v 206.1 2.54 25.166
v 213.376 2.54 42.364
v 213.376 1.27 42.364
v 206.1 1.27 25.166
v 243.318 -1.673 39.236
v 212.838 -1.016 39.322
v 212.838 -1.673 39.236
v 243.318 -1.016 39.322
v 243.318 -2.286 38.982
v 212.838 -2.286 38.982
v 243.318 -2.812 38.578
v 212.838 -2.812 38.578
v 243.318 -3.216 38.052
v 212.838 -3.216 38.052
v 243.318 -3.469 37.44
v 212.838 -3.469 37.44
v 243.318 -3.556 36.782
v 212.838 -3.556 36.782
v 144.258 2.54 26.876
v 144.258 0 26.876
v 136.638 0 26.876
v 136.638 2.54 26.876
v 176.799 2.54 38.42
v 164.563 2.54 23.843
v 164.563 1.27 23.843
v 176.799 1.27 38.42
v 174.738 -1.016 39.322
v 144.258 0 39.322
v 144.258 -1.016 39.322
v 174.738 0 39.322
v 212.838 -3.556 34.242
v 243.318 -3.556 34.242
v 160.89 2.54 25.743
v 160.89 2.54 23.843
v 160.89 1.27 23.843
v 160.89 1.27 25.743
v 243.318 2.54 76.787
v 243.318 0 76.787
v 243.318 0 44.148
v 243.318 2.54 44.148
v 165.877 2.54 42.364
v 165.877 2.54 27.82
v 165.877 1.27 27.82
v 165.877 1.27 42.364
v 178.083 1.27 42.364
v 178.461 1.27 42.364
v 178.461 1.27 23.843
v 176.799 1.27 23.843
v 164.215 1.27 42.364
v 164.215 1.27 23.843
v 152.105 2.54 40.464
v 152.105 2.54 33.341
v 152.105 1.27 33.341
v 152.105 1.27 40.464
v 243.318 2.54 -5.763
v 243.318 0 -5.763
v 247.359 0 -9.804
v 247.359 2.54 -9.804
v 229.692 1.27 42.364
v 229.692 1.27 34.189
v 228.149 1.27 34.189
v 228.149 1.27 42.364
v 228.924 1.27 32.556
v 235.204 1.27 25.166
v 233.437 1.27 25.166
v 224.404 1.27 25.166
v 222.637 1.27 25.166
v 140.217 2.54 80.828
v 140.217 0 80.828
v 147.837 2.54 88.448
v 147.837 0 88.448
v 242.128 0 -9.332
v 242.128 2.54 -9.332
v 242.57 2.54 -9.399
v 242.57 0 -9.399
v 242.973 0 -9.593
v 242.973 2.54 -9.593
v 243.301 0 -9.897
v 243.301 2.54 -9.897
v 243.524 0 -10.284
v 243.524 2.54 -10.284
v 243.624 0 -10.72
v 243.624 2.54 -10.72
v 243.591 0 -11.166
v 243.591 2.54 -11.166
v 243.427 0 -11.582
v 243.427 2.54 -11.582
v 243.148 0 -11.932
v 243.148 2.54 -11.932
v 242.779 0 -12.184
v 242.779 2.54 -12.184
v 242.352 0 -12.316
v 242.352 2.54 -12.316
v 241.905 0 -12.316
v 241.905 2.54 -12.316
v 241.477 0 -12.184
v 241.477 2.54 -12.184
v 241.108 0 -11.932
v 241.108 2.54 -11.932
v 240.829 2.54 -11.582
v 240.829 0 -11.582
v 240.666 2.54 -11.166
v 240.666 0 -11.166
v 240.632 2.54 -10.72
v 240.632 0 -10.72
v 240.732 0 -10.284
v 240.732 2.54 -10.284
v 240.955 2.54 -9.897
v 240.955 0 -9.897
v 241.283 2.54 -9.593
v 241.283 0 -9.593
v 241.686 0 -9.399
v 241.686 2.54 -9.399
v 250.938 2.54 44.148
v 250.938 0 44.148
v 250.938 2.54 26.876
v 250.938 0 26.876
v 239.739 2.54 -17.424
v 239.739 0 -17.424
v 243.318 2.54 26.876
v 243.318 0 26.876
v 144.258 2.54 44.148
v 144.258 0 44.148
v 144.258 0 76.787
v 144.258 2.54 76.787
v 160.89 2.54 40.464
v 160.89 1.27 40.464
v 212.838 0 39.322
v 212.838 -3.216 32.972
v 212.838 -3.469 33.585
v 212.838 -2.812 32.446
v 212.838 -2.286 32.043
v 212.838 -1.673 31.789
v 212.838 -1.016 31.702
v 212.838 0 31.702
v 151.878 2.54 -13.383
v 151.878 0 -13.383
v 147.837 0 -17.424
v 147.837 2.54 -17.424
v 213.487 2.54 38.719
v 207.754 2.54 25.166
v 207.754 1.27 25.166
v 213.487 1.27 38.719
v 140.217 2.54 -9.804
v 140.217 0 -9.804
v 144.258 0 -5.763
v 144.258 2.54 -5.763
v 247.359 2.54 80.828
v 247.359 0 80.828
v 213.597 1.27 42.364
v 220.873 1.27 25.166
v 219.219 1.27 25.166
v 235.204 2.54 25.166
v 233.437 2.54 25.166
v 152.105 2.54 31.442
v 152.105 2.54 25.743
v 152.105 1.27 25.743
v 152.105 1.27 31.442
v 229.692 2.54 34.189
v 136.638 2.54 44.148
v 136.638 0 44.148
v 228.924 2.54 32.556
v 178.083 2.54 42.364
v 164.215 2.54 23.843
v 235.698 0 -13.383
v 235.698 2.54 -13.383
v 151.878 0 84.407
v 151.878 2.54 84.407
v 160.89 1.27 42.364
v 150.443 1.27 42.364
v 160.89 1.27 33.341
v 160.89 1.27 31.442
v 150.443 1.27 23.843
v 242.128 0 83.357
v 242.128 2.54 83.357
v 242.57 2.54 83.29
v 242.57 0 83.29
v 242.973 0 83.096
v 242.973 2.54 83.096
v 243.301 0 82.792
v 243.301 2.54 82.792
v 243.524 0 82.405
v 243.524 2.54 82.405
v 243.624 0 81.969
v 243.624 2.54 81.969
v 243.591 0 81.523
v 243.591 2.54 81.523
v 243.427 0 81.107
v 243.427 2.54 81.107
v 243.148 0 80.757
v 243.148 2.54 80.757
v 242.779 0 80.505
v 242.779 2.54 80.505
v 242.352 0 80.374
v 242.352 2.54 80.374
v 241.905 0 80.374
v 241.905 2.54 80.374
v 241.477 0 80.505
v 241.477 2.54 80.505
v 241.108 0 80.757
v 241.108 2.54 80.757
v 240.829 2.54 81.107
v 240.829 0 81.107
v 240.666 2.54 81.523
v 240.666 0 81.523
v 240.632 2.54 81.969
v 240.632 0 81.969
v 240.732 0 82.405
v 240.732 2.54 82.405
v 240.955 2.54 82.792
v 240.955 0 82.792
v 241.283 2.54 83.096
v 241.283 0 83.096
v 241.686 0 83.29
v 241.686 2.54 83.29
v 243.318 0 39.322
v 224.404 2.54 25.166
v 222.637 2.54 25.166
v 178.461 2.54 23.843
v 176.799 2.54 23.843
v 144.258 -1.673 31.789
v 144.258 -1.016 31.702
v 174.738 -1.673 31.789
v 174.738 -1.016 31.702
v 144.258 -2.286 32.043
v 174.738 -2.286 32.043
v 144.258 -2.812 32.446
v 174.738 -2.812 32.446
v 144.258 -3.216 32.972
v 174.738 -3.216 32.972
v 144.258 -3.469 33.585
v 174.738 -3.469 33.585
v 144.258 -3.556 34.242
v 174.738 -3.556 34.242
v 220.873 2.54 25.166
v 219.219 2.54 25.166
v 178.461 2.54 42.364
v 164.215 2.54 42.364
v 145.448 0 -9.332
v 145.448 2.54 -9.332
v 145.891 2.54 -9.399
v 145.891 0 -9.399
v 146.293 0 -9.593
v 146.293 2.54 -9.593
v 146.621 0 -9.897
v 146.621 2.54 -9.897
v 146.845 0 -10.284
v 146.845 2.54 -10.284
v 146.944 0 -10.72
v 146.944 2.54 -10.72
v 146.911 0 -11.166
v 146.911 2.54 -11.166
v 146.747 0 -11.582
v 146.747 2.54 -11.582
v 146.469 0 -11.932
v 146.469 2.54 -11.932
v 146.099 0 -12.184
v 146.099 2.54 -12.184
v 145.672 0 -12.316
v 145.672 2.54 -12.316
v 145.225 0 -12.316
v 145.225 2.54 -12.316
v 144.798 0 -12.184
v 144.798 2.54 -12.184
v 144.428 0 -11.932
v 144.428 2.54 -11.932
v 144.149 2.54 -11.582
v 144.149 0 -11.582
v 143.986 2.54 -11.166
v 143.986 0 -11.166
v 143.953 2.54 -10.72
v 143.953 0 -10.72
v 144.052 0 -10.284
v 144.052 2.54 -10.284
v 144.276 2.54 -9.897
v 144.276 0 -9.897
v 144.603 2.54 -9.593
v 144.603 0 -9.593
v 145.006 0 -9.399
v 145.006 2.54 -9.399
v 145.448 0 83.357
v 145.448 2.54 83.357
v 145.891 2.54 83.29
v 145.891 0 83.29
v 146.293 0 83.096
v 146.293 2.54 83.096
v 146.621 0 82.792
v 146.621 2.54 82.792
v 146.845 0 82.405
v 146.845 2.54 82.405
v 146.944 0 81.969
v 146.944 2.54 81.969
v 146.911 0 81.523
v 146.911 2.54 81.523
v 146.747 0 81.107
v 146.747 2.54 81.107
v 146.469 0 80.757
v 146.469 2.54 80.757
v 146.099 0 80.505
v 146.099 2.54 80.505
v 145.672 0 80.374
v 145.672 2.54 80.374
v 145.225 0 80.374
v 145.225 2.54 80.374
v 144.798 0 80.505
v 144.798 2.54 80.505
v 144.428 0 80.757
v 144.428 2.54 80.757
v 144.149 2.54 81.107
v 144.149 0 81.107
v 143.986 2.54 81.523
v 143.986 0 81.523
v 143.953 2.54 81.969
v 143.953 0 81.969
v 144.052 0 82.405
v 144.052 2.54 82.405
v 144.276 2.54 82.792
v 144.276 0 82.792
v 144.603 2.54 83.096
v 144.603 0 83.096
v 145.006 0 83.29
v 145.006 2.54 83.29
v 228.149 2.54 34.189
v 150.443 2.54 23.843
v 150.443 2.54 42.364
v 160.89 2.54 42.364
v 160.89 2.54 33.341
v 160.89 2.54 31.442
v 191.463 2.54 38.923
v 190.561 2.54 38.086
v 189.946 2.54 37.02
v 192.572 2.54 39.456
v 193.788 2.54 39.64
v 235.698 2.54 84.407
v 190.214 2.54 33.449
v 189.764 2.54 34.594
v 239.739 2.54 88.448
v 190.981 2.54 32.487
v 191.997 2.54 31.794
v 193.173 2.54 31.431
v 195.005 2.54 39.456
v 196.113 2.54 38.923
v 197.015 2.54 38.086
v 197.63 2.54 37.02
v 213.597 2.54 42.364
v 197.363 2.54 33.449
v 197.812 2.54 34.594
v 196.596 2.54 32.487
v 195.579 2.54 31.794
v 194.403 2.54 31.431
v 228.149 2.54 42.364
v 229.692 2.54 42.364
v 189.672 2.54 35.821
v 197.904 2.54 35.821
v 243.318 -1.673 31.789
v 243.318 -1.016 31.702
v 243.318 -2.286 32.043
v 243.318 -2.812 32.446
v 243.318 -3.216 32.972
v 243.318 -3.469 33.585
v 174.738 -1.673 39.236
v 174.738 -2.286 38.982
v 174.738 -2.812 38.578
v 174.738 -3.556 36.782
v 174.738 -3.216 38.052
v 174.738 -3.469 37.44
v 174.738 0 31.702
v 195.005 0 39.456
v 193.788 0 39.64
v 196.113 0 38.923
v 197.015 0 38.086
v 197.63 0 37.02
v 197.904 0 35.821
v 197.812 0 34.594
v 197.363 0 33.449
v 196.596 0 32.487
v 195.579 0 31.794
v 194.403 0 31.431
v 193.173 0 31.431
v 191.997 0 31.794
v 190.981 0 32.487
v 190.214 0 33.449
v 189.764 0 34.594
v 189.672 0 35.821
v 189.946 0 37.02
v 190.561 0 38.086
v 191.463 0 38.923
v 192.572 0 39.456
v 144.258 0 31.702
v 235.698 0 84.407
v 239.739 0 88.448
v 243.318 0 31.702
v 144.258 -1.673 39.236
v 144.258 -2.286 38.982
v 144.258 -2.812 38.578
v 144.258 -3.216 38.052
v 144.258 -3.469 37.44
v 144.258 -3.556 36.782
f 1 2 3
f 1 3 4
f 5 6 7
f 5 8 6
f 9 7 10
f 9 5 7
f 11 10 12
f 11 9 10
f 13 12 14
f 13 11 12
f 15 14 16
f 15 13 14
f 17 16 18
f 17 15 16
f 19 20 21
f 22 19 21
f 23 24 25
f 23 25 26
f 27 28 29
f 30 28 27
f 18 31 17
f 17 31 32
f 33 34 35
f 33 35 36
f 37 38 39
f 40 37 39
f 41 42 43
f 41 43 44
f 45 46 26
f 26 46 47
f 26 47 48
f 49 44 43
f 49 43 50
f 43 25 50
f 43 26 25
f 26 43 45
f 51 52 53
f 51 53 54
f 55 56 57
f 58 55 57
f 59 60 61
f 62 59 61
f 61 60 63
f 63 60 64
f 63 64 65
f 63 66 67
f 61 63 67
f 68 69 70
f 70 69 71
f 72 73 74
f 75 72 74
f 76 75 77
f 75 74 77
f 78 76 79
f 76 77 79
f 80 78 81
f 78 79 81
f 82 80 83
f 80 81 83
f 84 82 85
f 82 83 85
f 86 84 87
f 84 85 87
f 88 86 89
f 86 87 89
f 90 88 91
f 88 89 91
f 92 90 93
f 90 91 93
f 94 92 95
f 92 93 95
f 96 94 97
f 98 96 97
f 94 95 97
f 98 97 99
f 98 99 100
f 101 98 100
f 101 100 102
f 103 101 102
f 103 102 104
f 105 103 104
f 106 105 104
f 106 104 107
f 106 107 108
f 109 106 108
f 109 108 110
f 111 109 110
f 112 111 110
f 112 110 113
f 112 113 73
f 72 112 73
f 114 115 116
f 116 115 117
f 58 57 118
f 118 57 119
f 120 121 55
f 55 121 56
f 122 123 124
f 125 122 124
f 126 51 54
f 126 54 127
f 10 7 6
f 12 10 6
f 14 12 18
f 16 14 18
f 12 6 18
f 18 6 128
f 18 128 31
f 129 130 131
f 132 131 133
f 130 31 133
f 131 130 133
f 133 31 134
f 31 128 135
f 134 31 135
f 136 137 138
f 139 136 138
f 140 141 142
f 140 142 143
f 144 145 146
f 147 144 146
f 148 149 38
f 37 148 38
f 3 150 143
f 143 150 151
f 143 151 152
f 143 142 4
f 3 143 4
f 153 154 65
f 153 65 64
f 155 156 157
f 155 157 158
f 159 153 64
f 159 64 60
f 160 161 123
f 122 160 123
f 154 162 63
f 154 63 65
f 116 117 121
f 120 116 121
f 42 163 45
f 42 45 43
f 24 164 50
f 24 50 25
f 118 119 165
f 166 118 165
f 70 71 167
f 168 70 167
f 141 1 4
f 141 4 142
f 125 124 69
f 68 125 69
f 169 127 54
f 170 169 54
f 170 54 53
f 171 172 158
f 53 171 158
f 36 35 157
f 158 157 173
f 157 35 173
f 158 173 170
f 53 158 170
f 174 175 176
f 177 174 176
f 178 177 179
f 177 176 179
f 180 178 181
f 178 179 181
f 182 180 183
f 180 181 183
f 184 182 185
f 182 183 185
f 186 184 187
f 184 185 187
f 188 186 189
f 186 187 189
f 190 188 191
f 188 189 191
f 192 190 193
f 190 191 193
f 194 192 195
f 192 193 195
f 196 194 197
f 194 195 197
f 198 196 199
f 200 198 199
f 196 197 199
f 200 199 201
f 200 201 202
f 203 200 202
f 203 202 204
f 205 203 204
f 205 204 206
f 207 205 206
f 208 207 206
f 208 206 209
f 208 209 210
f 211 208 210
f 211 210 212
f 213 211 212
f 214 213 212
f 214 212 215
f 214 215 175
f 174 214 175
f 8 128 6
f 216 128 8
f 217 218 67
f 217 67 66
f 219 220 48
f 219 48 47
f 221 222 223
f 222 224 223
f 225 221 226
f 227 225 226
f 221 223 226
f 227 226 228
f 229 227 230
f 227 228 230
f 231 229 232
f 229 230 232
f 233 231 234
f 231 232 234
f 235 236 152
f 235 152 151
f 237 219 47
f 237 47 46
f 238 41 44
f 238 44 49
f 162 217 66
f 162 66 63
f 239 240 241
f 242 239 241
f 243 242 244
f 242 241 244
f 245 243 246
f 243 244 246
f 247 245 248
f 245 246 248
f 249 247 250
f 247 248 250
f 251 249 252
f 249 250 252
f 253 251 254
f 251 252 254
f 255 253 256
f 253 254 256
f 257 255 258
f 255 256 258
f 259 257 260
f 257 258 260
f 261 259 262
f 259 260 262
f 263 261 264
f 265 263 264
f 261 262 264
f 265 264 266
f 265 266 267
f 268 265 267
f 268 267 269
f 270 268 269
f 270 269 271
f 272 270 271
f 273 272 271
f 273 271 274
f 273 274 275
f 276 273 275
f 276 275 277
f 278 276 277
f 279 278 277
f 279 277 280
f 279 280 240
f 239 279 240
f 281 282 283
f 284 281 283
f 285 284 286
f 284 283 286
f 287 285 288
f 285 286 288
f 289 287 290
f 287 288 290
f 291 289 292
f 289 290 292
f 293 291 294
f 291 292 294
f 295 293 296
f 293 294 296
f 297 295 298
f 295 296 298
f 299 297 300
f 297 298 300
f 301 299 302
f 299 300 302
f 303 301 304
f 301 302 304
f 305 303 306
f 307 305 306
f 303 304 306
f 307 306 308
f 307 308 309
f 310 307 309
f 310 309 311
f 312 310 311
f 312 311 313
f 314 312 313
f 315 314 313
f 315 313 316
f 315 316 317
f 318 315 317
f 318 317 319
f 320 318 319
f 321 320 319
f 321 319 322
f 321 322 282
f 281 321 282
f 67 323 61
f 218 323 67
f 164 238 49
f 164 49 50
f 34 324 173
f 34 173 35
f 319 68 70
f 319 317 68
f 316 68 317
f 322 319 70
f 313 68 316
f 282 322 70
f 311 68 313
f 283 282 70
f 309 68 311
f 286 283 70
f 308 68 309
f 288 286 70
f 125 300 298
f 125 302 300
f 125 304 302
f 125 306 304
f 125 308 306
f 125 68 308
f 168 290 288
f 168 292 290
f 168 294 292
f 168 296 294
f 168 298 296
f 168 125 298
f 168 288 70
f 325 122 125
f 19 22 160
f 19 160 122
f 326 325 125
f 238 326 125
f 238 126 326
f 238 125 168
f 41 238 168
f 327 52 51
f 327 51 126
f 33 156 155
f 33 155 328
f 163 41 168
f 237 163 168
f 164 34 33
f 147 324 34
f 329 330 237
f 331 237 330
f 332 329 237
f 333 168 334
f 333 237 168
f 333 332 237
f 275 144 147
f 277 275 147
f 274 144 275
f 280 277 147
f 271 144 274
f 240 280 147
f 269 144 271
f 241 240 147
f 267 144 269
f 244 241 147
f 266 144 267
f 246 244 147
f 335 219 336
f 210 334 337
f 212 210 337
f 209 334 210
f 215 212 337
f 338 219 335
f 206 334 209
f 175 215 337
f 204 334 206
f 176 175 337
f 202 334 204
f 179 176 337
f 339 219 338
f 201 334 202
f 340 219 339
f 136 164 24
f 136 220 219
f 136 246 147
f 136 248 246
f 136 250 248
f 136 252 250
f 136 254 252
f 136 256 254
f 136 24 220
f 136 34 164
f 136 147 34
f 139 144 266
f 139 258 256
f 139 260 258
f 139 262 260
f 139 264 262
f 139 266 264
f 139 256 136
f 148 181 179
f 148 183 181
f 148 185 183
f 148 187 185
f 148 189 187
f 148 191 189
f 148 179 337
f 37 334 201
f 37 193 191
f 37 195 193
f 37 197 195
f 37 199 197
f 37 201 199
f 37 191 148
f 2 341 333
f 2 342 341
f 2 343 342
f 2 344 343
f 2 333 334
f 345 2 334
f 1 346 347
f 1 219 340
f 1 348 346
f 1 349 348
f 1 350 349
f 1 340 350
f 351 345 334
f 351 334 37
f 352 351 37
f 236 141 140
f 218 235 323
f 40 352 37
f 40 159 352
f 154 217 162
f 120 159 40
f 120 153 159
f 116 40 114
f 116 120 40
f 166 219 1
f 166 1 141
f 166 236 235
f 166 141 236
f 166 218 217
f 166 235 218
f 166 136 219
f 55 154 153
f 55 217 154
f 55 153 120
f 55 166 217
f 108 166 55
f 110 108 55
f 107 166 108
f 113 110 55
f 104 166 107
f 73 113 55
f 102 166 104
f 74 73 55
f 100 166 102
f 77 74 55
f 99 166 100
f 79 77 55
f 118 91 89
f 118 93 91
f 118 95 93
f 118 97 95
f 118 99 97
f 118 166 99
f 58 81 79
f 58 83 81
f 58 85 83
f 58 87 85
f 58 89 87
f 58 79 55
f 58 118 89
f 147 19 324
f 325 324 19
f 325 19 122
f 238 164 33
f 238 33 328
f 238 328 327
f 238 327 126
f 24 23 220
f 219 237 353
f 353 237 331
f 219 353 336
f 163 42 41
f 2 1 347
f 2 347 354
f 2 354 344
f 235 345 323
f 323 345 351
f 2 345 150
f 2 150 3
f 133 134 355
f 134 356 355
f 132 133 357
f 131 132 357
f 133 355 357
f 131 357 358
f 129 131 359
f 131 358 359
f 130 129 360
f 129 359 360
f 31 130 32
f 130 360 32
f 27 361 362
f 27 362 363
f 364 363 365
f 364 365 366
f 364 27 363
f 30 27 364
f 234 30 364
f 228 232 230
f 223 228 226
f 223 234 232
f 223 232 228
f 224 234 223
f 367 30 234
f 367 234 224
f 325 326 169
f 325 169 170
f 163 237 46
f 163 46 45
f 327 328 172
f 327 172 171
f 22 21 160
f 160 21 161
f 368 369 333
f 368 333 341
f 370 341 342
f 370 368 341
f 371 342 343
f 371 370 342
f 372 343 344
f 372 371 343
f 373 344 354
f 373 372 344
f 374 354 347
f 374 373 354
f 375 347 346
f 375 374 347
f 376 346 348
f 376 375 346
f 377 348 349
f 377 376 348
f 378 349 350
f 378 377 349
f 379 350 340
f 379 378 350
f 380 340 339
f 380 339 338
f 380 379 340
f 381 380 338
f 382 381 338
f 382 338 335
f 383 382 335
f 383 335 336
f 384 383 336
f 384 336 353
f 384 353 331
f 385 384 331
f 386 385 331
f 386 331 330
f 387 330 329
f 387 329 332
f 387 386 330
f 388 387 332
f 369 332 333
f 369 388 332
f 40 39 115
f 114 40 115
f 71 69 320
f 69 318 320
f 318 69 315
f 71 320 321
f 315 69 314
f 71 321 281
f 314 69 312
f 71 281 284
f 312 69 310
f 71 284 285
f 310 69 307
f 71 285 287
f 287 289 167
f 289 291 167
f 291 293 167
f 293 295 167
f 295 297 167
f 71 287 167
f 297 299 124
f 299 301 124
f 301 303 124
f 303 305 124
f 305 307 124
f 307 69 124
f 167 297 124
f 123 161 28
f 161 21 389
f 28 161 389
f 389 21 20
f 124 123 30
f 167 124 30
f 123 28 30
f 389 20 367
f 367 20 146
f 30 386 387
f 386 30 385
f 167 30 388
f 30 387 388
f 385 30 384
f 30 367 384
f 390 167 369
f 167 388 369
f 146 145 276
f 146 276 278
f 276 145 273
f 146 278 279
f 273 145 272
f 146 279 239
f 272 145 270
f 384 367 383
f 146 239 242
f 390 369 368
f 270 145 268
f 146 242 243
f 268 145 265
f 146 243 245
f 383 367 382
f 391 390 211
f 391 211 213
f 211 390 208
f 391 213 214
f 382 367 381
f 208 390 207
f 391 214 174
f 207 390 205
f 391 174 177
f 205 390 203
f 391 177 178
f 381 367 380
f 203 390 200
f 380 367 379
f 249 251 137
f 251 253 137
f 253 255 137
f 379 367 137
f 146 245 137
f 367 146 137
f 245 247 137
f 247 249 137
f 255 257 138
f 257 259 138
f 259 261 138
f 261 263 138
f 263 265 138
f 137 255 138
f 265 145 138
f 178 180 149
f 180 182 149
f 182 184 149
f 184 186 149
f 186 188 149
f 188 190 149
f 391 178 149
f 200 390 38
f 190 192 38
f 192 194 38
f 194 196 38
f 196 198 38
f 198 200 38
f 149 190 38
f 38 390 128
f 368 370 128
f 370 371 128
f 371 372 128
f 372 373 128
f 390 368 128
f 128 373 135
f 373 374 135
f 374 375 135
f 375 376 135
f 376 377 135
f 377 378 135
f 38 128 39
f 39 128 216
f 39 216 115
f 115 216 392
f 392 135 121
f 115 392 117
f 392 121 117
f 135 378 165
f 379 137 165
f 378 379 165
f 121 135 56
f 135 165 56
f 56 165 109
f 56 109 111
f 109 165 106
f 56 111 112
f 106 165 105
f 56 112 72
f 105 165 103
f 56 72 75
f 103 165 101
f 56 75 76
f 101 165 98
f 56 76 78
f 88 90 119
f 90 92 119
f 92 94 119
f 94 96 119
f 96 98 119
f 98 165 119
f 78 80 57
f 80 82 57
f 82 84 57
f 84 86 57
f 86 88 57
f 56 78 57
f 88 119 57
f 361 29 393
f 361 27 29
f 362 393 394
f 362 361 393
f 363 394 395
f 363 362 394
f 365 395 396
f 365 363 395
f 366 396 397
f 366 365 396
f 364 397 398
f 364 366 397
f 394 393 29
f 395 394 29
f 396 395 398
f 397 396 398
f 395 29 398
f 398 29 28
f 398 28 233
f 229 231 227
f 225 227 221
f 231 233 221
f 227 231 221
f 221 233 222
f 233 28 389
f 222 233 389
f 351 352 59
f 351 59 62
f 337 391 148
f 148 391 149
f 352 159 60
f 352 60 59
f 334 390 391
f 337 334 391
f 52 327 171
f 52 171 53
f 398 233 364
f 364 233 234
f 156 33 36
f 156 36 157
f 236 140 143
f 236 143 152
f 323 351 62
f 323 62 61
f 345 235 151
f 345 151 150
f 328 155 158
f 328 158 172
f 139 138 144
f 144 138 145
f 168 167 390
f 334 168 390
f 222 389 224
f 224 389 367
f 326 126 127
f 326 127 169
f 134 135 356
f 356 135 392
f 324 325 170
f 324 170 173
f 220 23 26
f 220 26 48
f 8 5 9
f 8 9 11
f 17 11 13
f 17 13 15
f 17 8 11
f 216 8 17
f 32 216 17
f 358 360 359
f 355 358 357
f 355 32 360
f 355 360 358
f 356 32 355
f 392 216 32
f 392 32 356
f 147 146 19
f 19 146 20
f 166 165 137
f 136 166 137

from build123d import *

# Parameters (mm, degrees)
SKETCH1_R           = 4.1275
BOSS_EXTRUDE1_DEPTH = 2.54
SKETCH2_R           = 1.5
CUT_EXTRUDE1_DEPTH  = 267.081941915
CUT_EXTRUDE2_DEPTH  = 1.27
SKETCH1_5_W         = 30.48
SKETCH1_5_H         = 7.62
BOSS_EXTRUDE2_DEPTH = 3.556
FILLET1_R           = 2.54


with BuildPart() as part:
    # Sketch1 → Boss-Extrude1 (new body)
    with BuildSketch(Plane(origin=(0, 0, 0), x_dir=(1, 0, 0), z_dir=(0, 1, 0))):
        Polygon((239.739404703, 17.423809937), (235.698289449, 13.382694682), (151.878289449, 13.382694682), (147.837174194, 17.423809937), (140.217174194, 9.803809937), (144.258289449, 5.762694682), (144.258289449, -26.876305318), (136.638289449, -26.876305318), (136.638289449, -44.148305318), (144.258289449, -44.148305318), (144.258289449, -76.787305318), (140.217174194, -80.828420572), (147.837174194, -88.448420572), (151.878289449, -84.407305318), (235.698289449, -84.407305318), (239.739404703, -88.448420572), (247.359404703, -80.828420572), (243.318289449, -76.787305318), (243.318289449, -44.148305318), (250.938289449, -44.148305318), (250.938289449, -26.876305318), (243.318289449, -26.876305318), (243.318289449, 5.762694682), (247.359404703, 9.803809937), align=None)
        with Locations((193.788289449, -35.512305318)):
            Circle(SKETCH1_R, mode=Mode.SUBTRACT)
    extrude(amount=BOSS_EXTRUDE1_DEPTH)

    # Sketch2 → Cut-Extrude1 (cut, through all)
    with BuildSketch(Plane(origin=(0, 2.54, 0), x_dir=(1, 0, 0), z_dir=(0, 1, 0))):
        with Locations((145.448426066, 10.832301944)):
            Circle(SKETCH2_R)
        with Locations((242.128152831, 10.832301944)):
            Circle(SKETCH2_R)
        with Locations((242.128152831, -81.856912579)):
            Circle(SKETCH2_R)
        with Locations((145.448426066, -81.856912579)):
            Circle(SKETCH2_R)
    extrude(amount=-CUT_EXTRUDE1_DEPTH, mode=Mode.SUBTRACT)

    # Sketch3 → Cut-Extrude2 (cut)
    with BuildSketch(Plane(origin=(0, 2.54, 0), x_dir=(1, 0, 0), z_dir=(0, 1, 0))):
        Polygon((150.442755261, -23.843216639), (160.890404833, -23.843216639), (160.890404833, -25.742789289), (152.104881329, -25.742789289), (152.104881329, -31.441507237), (160.890404833, -31.441507237), (160.890404833, -33.341079887), (152.104881329, -33.341079887), (152.104881329, -40.464477323), (160.890404833, -40.464477323), (160.890404833, -42.364049972), (150.442755261, -42.364049972), align=None)
        Polygon((164.21465697, -42.364049972), (164.21465697, -23.843216639), (164.563406636, -23.843216639), (176.799325773, -38.420210663), (176.799325773, -23.843216639), (178.461451842, -23.843216639), (178.461451842, -42.364049972), (178.083021353, -42.364049972), (165.876783038, -27.820446874), (165.876783038, -42.364049972), align=None)
        Polygon((206.100233893, -25.166133306), (207.753879726, -25.166133306), (213.486518615, -38.719138948), (219.219157504, -25.166133306), (220.872803338, -25.166133306), (213.596761671, -42.364049972), (213.37627556, -42.364049972), align=None)
        Polygon((222.636692226, -25.166133306), (224.404026211, -25.166133306), (228.923991489, -32.555863124), (233.437066575, -25.166133306), (235.20440056, -25.166133306), (229.692247782, -34.188838384), (229.692247782, -42.364049972), (228.148845004, -42.364049972), (228.148845004, -34.188838384), align=None)
    extrude(amount=-CUT_EXTRUDE2_DEPTH, mode=Mode.SUBTRACT)

    # Sketch1<5> → Boss-Extrude2 (add)
    with BuildSketch(Plane(origin=(0, 0, 0), x_dir=(1, 0, 0), z_dir=(0, 1, 0))):
        with Locations((228.078289449, -35.512305318)):
            Rectangle(SKETCH1_5_W, SKETCH1_5_H)
        with Locations((159.498289449, -35.512305318)):
            Rectangle(SKETCH1_5_W, SKETCH1_5_H)
    extrude(amount=-BOSS_EXTRUDE2_DEPTH)

    # Fillet1
    fillet1_edges = [part.edges().sort_by_distance(p)[0] for p in [
        (228.078289449, -3.556, 39.322305318),
        (228.078289449, -3.556, 31.702305318),
        (159.498289449, -3.556, 31.702305318),
        (159.498289449, -3.556, 39.322305318),
    ]]
    fillet(fillet1_edges, radius=FILLET1_R)


solid = part.part
